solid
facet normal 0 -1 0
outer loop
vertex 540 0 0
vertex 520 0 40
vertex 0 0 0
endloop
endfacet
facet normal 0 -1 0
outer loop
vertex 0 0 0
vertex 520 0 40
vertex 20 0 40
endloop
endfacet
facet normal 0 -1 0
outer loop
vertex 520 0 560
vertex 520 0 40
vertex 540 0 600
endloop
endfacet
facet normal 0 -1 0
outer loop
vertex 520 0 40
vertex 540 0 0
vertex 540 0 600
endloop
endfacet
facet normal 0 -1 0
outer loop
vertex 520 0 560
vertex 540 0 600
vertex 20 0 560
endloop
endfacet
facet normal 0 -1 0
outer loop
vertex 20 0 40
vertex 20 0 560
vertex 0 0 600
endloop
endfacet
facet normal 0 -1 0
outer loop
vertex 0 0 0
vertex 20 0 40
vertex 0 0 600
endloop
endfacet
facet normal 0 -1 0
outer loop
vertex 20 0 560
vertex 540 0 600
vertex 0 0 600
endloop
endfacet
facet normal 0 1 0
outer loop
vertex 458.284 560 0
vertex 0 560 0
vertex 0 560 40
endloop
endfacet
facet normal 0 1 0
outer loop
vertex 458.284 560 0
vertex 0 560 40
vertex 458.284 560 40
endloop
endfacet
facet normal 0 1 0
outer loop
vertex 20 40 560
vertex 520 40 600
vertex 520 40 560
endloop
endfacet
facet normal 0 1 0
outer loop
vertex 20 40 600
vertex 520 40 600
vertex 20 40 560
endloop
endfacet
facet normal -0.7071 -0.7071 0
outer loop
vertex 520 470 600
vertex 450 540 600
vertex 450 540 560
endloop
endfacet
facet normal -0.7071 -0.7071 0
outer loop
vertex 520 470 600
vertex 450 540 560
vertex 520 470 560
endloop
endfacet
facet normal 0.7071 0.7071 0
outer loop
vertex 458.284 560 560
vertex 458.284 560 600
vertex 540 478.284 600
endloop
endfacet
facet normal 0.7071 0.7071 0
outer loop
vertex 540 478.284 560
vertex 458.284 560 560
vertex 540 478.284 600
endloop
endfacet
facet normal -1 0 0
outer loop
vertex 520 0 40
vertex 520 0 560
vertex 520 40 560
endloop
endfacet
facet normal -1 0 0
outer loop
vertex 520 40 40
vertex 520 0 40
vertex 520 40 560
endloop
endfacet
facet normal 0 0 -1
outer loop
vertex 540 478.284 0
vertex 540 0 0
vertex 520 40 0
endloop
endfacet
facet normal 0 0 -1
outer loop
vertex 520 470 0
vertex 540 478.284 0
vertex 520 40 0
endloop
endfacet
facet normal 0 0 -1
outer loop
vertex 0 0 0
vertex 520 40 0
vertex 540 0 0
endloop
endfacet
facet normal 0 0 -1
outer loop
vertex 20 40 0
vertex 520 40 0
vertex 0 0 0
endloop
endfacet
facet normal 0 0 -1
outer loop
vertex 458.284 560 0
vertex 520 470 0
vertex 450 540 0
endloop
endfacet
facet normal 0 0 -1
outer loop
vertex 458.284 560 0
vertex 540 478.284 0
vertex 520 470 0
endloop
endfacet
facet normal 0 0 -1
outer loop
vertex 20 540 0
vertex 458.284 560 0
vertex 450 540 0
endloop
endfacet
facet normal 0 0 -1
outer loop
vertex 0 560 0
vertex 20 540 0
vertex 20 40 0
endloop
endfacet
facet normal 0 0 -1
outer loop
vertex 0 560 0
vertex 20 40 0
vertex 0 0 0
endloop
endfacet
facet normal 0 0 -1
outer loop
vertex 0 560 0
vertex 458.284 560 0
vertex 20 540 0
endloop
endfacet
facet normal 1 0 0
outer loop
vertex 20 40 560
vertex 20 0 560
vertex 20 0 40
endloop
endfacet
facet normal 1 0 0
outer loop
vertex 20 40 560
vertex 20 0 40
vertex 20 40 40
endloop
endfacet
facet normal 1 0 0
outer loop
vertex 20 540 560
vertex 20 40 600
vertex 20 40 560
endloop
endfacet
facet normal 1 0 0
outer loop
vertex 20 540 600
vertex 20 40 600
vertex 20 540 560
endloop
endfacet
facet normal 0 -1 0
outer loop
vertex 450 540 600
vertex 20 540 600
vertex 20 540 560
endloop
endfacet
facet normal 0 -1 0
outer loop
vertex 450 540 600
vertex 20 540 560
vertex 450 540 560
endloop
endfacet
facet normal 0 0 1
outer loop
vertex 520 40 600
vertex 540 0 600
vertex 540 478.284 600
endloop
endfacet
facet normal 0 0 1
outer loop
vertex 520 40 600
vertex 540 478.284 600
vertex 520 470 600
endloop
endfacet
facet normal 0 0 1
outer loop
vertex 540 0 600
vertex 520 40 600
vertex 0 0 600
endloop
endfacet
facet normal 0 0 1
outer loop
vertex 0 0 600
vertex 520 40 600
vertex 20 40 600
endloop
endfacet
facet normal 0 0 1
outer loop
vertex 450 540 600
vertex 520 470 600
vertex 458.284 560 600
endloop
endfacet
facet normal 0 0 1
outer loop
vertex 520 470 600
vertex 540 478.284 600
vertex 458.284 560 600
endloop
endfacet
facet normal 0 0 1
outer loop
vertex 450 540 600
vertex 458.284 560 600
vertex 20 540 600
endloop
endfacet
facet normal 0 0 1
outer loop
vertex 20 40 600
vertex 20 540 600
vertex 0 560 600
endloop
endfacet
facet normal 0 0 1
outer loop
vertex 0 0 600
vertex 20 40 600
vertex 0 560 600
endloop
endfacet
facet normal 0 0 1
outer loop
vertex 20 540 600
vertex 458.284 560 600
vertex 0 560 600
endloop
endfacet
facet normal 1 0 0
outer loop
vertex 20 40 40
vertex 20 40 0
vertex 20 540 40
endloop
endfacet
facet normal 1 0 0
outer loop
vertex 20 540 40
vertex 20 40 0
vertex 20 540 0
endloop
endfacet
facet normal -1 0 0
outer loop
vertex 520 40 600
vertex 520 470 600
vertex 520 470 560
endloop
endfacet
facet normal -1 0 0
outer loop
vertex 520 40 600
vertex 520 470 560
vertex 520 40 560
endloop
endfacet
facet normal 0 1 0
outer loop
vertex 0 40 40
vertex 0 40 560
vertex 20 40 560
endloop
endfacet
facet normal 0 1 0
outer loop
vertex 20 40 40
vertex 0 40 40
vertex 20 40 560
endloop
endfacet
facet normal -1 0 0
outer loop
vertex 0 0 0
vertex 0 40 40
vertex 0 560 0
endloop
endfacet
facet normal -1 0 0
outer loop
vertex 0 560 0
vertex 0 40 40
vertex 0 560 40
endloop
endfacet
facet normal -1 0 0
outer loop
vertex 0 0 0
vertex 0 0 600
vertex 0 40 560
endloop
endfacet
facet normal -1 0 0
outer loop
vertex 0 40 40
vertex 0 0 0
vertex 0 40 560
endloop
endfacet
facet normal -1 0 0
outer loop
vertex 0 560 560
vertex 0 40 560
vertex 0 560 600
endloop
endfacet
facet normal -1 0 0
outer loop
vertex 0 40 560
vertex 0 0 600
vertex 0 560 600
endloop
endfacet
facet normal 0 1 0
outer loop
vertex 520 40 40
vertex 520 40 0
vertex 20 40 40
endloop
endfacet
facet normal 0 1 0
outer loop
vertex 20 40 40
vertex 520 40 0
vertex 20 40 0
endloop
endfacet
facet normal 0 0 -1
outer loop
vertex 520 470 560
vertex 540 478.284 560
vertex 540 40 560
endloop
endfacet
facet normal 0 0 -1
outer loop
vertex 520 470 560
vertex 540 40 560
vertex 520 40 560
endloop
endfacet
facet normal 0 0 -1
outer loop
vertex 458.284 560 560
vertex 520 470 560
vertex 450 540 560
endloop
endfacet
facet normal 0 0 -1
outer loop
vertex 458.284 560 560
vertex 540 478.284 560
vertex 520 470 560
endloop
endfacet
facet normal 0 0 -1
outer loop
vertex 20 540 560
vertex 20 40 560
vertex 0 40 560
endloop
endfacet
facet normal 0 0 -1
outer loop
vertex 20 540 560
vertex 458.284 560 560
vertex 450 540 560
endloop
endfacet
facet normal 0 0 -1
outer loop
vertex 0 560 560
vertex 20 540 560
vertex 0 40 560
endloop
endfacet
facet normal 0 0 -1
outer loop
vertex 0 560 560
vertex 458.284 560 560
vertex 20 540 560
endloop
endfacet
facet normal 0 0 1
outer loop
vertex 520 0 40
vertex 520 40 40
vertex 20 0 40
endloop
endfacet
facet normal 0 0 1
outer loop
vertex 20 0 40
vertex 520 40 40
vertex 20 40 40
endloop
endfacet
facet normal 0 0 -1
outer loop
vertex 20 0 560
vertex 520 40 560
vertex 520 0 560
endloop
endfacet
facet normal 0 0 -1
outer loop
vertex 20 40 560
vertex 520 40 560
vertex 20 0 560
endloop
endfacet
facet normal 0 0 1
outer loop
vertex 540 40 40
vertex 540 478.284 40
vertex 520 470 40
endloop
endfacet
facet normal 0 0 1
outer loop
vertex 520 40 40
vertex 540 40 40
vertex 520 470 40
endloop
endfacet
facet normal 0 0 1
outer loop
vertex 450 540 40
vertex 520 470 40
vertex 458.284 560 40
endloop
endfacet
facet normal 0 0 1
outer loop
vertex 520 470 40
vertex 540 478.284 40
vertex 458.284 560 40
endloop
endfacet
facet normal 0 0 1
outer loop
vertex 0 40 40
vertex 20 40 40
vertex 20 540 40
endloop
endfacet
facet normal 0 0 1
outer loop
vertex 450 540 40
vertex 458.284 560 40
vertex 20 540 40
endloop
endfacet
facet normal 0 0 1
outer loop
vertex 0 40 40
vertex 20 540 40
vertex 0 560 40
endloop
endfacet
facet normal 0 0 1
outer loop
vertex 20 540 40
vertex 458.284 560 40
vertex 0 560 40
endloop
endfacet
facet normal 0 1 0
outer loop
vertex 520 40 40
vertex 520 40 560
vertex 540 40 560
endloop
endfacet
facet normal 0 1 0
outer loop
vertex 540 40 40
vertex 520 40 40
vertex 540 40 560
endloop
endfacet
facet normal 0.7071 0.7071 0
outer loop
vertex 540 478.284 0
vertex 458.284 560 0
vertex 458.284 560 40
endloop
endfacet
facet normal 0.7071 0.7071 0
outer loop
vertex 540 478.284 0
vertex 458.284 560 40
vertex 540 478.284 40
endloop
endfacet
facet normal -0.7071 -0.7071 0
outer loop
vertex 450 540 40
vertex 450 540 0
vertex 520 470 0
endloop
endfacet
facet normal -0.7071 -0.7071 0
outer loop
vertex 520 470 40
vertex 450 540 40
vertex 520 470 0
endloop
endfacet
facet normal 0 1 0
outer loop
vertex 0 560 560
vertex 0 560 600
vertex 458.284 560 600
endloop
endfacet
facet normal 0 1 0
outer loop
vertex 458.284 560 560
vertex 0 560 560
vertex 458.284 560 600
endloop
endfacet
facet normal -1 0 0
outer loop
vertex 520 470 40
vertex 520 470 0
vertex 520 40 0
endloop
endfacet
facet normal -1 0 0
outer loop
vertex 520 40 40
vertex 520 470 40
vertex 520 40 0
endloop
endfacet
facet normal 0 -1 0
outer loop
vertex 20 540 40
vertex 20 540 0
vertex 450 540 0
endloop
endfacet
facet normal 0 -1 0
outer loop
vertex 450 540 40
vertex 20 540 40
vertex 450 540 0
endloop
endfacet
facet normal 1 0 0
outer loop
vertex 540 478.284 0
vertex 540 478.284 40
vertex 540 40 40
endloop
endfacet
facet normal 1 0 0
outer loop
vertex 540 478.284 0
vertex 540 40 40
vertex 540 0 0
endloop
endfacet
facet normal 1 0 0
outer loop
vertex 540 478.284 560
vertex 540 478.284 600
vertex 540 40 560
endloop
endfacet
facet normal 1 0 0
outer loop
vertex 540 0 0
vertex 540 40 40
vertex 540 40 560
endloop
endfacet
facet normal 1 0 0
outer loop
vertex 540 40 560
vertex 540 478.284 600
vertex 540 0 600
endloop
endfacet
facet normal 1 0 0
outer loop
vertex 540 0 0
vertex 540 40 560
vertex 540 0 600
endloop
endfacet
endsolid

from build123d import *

# Parameters (mm, degrees)
BOSS_EXTRUDE1_DEPTH = 40
SKETCH2_W           = 20
SKETCH2_H           = 40
BOSS_EXTRUDE2_DEPTH = 520


with BuildPart() as part:
    # Sketch1 → Boss-Extrude1 (new body)
    with BuildSketch(Plane.XY):
        Polygon((0, 0), (0, 560), (458.284271247, 560), (540, 478.284271247), (540, 0), align=None)
        Polygon((20, 40), (20, 540), (450, 540), (520, 470), (520, 40), align=None, mode=Mode.SUBTRACT)
    boss_extrude1 = extrude(amount=BOSS_EXTRUDE1_DEPTH)

    # Sketch2 → Boss-Extrude2 (add)
    with BuildSketch(Plane.XY.offset(40)):
        with Locations((530, 20)):
            Rectangle(SKETCH2_W, SKETCH2_H)
        with Locations((10, 20)):
            Rectangle(SKETCH2_W, SKETCH2_H)
    extrude(amount=BOSS_EXTRUDE2_DEPTH)

    # Mirror1: Boss-Extrude1 across plane
    add(boss_extrude1.mirror(Plane(origin=(0, 0, 300), x_dir=(1, 0, 0), z_dir=(0, 0, -1))))


solid = part.part
